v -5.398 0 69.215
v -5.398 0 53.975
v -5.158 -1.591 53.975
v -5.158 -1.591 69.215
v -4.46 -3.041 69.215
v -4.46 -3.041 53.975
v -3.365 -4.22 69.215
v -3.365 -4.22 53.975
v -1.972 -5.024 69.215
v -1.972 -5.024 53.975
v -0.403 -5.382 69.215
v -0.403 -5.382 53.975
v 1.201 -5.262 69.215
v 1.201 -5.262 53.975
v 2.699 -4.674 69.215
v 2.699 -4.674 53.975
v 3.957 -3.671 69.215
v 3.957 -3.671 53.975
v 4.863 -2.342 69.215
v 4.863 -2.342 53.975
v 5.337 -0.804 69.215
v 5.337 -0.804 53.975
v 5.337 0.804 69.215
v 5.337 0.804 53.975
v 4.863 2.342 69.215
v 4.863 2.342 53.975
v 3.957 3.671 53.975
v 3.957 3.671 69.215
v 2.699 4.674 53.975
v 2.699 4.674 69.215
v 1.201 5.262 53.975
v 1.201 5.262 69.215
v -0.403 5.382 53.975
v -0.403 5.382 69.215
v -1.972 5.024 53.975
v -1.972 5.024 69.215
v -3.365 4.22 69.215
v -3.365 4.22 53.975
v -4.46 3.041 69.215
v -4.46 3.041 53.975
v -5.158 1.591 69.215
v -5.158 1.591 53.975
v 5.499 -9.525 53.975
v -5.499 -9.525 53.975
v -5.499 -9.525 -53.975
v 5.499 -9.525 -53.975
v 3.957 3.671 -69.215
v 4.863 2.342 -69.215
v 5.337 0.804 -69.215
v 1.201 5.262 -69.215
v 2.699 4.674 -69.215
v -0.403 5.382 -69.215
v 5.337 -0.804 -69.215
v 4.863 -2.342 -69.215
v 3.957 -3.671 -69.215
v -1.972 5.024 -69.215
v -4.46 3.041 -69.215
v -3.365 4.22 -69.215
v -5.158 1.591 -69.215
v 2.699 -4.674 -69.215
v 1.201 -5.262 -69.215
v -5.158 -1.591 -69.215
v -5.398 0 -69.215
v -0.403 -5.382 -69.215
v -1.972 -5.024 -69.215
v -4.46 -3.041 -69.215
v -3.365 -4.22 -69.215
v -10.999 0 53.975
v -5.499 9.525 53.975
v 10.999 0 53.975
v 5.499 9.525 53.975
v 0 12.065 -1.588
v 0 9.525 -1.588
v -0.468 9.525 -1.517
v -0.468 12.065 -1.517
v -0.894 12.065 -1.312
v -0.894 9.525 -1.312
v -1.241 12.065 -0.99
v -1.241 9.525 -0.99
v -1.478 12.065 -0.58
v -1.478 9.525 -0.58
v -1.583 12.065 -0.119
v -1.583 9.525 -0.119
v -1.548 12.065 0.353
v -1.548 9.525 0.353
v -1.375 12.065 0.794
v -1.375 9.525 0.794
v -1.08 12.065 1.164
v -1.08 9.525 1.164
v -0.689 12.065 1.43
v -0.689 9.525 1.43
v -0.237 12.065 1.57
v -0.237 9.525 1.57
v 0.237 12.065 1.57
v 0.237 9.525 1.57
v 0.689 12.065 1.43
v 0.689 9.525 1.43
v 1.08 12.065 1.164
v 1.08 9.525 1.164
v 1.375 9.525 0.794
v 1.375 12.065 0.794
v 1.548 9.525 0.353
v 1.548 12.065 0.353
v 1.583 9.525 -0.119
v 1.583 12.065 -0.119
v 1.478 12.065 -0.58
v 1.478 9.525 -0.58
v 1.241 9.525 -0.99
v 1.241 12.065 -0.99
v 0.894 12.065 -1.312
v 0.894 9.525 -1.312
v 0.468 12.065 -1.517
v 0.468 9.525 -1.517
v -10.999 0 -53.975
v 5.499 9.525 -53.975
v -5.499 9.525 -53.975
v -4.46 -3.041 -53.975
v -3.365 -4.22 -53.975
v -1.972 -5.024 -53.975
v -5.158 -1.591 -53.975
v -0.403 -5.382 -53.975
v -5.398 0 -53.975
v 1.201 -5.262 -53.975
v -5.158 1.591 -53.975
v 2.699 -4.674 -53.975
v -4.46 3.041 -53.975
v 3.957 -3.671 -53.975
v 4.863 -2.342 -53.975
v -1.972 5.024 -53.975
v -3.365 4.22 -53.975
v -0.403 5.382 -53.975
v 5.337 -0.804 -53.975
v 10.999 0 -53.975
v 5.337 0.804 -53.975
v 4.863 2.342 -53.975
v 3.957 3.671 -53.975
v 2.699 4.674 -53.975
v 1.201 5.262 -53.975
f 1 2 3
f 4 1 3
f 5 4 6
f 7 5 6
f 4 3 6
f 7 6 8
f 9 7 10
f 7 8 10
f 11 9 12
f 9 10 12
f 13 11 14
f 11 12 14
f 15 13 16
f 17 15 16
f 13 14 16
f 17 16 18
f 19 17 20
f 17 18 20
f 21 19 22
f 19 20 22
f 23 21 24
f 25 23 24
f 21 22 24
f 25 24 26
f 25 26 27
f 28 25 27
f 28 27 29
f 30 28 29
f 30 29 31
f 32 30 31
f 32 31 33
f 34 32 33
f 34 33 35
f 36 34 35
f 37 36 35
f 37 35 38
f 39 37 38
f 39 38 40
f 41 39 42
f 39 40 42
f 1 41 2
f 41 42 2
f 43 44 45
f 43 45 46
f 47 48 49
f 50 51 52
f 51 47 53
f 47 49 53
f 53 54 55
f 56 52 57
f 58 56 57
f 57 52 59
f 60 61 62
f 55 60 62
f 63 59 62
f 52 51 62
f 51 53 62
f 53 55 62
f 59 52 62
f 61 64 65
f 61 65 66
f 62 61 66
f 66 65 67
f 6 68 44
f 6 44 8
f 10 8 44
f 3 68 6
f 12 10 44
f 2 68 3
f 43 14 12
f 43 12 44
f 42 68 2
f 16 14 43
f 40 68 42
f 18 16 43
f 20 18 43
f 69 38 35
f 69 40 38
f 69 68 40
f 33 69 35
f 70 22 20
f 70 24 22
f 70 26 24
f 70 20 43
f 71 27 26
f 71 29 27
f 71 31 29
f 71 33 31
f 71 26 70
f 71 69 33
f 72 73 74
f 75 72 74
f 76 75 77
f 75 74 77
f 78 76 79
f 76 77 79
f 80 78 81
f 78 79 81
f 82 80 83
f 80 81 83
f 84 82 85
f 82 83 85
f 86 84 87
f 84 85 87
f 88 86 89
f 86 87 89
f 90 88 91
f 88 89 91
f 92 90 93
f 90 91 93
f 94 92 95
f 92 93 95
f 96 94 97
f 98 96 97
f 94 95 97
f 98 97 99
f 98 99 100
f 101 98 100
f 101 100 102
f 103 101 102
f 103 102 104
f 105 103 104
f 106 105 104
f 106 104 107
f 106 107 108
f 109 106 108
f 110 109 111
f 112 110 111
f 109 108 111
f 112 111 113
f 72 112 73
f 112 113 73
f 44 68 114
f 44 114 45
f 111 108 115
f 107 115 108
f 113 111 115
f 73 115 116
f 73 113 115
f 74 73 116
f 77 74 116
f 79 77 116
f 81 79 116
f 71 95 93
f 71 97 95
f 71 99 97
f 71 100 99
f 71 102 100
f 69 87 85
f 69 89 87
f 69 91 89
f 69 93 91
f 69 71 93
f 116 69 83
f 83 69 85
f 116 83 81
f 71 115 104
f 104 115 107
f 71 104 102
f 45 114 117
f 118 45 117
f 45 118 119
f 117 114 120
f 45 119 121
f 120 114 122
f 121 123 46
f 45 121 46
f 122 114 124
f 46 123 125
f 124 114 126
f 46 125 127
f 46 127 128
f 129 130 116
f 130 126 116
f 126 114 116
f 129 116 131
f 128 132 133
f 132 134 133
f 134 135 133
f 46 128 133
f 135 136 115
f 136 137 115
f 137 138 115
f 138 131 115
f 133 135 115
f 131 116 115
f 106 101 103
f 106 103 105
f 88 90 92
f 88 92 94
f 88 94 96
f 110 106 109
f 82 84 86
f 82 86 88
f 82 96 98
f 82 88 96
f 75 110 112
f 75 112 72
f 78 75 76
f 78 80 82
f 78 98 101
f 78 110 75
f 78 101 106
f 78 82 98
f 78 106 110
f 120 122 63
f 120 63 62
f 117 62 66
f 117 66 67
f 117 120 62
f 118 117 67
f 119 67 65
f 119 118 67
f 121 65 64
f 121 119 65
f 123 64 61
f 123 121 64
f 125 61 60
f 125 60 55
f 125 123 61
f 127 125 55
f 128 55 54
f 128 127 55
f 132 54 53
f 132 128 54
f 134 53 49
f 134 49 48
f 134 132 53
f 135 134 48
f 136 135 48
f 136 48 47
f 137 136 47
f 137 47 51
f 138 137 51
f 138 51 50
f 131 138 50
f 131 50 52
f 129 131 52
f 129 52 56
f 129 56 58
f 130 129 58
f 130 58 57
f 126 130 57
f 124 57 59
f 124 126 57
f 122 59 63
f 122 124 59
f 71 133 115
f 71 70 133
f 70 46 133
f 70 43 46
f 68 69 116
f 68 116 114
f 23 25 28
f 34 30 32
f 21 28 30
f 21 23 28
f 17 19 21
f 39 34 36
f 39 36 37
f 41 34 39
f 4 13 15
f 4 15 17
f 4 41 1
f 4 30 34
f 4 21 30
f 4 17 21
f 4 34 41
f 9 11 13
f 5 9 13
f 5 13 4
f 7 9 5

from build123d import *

# Parameters (mm, degrees)
BOSS_EXTRUDE1_DEPTH = 53.975
SKETCH2_R           = 5.3975
BOSS_EXTRUDE2_DEPTH = 15.24
SKETCH3_R           = 1.5875
BOSS_EXTRUDE3_DEPTH = 2.54


with BuildPart() as part:
    # Sketch1 → Boss-Extrude1 (new body)
    with BuildSketch(Plane.XY):
        Polygon((5.499261314, 9.525), (-5.499261314, 9.525), (-10.998522628, 0), (-5.499261314, -9.525), (5.499261314, -9.525), (10.998522628, 0), align=None)
    extrude(amount=BOSS_EXTRUDE1_DEPTH)

    # Sketch2 → Boss-Extrude2 (add)
    with BuildSketch(Plane.XY.offset(53.975)):
        with Locations(Location((0, 0, 0), (0, 0, 180))):
            Circle(SKETCH2_R)
    extrude(amount=BOSS_EXTRUDE2_DEPTH)

    # Mirror1: part across plane


with BuildPart() as part_1:
    add(part.part)
    add(part.part.mirror(Plane.XY))

    # Sketch3 → Boss-Extrude3 (add)
    with BuildSketch(Plane(origin=(0, 9.525, 0), x_dir=(1, 0, 0), z_dir=(0, 1, 0))):
        with Locations(Location((0, 0, 0), (0, 0, 90))):
            Circle(SKETCH3_R)
    extrude(amount=BOSS_EXTRUDE3_DEPTH)


solid = part_1.part
